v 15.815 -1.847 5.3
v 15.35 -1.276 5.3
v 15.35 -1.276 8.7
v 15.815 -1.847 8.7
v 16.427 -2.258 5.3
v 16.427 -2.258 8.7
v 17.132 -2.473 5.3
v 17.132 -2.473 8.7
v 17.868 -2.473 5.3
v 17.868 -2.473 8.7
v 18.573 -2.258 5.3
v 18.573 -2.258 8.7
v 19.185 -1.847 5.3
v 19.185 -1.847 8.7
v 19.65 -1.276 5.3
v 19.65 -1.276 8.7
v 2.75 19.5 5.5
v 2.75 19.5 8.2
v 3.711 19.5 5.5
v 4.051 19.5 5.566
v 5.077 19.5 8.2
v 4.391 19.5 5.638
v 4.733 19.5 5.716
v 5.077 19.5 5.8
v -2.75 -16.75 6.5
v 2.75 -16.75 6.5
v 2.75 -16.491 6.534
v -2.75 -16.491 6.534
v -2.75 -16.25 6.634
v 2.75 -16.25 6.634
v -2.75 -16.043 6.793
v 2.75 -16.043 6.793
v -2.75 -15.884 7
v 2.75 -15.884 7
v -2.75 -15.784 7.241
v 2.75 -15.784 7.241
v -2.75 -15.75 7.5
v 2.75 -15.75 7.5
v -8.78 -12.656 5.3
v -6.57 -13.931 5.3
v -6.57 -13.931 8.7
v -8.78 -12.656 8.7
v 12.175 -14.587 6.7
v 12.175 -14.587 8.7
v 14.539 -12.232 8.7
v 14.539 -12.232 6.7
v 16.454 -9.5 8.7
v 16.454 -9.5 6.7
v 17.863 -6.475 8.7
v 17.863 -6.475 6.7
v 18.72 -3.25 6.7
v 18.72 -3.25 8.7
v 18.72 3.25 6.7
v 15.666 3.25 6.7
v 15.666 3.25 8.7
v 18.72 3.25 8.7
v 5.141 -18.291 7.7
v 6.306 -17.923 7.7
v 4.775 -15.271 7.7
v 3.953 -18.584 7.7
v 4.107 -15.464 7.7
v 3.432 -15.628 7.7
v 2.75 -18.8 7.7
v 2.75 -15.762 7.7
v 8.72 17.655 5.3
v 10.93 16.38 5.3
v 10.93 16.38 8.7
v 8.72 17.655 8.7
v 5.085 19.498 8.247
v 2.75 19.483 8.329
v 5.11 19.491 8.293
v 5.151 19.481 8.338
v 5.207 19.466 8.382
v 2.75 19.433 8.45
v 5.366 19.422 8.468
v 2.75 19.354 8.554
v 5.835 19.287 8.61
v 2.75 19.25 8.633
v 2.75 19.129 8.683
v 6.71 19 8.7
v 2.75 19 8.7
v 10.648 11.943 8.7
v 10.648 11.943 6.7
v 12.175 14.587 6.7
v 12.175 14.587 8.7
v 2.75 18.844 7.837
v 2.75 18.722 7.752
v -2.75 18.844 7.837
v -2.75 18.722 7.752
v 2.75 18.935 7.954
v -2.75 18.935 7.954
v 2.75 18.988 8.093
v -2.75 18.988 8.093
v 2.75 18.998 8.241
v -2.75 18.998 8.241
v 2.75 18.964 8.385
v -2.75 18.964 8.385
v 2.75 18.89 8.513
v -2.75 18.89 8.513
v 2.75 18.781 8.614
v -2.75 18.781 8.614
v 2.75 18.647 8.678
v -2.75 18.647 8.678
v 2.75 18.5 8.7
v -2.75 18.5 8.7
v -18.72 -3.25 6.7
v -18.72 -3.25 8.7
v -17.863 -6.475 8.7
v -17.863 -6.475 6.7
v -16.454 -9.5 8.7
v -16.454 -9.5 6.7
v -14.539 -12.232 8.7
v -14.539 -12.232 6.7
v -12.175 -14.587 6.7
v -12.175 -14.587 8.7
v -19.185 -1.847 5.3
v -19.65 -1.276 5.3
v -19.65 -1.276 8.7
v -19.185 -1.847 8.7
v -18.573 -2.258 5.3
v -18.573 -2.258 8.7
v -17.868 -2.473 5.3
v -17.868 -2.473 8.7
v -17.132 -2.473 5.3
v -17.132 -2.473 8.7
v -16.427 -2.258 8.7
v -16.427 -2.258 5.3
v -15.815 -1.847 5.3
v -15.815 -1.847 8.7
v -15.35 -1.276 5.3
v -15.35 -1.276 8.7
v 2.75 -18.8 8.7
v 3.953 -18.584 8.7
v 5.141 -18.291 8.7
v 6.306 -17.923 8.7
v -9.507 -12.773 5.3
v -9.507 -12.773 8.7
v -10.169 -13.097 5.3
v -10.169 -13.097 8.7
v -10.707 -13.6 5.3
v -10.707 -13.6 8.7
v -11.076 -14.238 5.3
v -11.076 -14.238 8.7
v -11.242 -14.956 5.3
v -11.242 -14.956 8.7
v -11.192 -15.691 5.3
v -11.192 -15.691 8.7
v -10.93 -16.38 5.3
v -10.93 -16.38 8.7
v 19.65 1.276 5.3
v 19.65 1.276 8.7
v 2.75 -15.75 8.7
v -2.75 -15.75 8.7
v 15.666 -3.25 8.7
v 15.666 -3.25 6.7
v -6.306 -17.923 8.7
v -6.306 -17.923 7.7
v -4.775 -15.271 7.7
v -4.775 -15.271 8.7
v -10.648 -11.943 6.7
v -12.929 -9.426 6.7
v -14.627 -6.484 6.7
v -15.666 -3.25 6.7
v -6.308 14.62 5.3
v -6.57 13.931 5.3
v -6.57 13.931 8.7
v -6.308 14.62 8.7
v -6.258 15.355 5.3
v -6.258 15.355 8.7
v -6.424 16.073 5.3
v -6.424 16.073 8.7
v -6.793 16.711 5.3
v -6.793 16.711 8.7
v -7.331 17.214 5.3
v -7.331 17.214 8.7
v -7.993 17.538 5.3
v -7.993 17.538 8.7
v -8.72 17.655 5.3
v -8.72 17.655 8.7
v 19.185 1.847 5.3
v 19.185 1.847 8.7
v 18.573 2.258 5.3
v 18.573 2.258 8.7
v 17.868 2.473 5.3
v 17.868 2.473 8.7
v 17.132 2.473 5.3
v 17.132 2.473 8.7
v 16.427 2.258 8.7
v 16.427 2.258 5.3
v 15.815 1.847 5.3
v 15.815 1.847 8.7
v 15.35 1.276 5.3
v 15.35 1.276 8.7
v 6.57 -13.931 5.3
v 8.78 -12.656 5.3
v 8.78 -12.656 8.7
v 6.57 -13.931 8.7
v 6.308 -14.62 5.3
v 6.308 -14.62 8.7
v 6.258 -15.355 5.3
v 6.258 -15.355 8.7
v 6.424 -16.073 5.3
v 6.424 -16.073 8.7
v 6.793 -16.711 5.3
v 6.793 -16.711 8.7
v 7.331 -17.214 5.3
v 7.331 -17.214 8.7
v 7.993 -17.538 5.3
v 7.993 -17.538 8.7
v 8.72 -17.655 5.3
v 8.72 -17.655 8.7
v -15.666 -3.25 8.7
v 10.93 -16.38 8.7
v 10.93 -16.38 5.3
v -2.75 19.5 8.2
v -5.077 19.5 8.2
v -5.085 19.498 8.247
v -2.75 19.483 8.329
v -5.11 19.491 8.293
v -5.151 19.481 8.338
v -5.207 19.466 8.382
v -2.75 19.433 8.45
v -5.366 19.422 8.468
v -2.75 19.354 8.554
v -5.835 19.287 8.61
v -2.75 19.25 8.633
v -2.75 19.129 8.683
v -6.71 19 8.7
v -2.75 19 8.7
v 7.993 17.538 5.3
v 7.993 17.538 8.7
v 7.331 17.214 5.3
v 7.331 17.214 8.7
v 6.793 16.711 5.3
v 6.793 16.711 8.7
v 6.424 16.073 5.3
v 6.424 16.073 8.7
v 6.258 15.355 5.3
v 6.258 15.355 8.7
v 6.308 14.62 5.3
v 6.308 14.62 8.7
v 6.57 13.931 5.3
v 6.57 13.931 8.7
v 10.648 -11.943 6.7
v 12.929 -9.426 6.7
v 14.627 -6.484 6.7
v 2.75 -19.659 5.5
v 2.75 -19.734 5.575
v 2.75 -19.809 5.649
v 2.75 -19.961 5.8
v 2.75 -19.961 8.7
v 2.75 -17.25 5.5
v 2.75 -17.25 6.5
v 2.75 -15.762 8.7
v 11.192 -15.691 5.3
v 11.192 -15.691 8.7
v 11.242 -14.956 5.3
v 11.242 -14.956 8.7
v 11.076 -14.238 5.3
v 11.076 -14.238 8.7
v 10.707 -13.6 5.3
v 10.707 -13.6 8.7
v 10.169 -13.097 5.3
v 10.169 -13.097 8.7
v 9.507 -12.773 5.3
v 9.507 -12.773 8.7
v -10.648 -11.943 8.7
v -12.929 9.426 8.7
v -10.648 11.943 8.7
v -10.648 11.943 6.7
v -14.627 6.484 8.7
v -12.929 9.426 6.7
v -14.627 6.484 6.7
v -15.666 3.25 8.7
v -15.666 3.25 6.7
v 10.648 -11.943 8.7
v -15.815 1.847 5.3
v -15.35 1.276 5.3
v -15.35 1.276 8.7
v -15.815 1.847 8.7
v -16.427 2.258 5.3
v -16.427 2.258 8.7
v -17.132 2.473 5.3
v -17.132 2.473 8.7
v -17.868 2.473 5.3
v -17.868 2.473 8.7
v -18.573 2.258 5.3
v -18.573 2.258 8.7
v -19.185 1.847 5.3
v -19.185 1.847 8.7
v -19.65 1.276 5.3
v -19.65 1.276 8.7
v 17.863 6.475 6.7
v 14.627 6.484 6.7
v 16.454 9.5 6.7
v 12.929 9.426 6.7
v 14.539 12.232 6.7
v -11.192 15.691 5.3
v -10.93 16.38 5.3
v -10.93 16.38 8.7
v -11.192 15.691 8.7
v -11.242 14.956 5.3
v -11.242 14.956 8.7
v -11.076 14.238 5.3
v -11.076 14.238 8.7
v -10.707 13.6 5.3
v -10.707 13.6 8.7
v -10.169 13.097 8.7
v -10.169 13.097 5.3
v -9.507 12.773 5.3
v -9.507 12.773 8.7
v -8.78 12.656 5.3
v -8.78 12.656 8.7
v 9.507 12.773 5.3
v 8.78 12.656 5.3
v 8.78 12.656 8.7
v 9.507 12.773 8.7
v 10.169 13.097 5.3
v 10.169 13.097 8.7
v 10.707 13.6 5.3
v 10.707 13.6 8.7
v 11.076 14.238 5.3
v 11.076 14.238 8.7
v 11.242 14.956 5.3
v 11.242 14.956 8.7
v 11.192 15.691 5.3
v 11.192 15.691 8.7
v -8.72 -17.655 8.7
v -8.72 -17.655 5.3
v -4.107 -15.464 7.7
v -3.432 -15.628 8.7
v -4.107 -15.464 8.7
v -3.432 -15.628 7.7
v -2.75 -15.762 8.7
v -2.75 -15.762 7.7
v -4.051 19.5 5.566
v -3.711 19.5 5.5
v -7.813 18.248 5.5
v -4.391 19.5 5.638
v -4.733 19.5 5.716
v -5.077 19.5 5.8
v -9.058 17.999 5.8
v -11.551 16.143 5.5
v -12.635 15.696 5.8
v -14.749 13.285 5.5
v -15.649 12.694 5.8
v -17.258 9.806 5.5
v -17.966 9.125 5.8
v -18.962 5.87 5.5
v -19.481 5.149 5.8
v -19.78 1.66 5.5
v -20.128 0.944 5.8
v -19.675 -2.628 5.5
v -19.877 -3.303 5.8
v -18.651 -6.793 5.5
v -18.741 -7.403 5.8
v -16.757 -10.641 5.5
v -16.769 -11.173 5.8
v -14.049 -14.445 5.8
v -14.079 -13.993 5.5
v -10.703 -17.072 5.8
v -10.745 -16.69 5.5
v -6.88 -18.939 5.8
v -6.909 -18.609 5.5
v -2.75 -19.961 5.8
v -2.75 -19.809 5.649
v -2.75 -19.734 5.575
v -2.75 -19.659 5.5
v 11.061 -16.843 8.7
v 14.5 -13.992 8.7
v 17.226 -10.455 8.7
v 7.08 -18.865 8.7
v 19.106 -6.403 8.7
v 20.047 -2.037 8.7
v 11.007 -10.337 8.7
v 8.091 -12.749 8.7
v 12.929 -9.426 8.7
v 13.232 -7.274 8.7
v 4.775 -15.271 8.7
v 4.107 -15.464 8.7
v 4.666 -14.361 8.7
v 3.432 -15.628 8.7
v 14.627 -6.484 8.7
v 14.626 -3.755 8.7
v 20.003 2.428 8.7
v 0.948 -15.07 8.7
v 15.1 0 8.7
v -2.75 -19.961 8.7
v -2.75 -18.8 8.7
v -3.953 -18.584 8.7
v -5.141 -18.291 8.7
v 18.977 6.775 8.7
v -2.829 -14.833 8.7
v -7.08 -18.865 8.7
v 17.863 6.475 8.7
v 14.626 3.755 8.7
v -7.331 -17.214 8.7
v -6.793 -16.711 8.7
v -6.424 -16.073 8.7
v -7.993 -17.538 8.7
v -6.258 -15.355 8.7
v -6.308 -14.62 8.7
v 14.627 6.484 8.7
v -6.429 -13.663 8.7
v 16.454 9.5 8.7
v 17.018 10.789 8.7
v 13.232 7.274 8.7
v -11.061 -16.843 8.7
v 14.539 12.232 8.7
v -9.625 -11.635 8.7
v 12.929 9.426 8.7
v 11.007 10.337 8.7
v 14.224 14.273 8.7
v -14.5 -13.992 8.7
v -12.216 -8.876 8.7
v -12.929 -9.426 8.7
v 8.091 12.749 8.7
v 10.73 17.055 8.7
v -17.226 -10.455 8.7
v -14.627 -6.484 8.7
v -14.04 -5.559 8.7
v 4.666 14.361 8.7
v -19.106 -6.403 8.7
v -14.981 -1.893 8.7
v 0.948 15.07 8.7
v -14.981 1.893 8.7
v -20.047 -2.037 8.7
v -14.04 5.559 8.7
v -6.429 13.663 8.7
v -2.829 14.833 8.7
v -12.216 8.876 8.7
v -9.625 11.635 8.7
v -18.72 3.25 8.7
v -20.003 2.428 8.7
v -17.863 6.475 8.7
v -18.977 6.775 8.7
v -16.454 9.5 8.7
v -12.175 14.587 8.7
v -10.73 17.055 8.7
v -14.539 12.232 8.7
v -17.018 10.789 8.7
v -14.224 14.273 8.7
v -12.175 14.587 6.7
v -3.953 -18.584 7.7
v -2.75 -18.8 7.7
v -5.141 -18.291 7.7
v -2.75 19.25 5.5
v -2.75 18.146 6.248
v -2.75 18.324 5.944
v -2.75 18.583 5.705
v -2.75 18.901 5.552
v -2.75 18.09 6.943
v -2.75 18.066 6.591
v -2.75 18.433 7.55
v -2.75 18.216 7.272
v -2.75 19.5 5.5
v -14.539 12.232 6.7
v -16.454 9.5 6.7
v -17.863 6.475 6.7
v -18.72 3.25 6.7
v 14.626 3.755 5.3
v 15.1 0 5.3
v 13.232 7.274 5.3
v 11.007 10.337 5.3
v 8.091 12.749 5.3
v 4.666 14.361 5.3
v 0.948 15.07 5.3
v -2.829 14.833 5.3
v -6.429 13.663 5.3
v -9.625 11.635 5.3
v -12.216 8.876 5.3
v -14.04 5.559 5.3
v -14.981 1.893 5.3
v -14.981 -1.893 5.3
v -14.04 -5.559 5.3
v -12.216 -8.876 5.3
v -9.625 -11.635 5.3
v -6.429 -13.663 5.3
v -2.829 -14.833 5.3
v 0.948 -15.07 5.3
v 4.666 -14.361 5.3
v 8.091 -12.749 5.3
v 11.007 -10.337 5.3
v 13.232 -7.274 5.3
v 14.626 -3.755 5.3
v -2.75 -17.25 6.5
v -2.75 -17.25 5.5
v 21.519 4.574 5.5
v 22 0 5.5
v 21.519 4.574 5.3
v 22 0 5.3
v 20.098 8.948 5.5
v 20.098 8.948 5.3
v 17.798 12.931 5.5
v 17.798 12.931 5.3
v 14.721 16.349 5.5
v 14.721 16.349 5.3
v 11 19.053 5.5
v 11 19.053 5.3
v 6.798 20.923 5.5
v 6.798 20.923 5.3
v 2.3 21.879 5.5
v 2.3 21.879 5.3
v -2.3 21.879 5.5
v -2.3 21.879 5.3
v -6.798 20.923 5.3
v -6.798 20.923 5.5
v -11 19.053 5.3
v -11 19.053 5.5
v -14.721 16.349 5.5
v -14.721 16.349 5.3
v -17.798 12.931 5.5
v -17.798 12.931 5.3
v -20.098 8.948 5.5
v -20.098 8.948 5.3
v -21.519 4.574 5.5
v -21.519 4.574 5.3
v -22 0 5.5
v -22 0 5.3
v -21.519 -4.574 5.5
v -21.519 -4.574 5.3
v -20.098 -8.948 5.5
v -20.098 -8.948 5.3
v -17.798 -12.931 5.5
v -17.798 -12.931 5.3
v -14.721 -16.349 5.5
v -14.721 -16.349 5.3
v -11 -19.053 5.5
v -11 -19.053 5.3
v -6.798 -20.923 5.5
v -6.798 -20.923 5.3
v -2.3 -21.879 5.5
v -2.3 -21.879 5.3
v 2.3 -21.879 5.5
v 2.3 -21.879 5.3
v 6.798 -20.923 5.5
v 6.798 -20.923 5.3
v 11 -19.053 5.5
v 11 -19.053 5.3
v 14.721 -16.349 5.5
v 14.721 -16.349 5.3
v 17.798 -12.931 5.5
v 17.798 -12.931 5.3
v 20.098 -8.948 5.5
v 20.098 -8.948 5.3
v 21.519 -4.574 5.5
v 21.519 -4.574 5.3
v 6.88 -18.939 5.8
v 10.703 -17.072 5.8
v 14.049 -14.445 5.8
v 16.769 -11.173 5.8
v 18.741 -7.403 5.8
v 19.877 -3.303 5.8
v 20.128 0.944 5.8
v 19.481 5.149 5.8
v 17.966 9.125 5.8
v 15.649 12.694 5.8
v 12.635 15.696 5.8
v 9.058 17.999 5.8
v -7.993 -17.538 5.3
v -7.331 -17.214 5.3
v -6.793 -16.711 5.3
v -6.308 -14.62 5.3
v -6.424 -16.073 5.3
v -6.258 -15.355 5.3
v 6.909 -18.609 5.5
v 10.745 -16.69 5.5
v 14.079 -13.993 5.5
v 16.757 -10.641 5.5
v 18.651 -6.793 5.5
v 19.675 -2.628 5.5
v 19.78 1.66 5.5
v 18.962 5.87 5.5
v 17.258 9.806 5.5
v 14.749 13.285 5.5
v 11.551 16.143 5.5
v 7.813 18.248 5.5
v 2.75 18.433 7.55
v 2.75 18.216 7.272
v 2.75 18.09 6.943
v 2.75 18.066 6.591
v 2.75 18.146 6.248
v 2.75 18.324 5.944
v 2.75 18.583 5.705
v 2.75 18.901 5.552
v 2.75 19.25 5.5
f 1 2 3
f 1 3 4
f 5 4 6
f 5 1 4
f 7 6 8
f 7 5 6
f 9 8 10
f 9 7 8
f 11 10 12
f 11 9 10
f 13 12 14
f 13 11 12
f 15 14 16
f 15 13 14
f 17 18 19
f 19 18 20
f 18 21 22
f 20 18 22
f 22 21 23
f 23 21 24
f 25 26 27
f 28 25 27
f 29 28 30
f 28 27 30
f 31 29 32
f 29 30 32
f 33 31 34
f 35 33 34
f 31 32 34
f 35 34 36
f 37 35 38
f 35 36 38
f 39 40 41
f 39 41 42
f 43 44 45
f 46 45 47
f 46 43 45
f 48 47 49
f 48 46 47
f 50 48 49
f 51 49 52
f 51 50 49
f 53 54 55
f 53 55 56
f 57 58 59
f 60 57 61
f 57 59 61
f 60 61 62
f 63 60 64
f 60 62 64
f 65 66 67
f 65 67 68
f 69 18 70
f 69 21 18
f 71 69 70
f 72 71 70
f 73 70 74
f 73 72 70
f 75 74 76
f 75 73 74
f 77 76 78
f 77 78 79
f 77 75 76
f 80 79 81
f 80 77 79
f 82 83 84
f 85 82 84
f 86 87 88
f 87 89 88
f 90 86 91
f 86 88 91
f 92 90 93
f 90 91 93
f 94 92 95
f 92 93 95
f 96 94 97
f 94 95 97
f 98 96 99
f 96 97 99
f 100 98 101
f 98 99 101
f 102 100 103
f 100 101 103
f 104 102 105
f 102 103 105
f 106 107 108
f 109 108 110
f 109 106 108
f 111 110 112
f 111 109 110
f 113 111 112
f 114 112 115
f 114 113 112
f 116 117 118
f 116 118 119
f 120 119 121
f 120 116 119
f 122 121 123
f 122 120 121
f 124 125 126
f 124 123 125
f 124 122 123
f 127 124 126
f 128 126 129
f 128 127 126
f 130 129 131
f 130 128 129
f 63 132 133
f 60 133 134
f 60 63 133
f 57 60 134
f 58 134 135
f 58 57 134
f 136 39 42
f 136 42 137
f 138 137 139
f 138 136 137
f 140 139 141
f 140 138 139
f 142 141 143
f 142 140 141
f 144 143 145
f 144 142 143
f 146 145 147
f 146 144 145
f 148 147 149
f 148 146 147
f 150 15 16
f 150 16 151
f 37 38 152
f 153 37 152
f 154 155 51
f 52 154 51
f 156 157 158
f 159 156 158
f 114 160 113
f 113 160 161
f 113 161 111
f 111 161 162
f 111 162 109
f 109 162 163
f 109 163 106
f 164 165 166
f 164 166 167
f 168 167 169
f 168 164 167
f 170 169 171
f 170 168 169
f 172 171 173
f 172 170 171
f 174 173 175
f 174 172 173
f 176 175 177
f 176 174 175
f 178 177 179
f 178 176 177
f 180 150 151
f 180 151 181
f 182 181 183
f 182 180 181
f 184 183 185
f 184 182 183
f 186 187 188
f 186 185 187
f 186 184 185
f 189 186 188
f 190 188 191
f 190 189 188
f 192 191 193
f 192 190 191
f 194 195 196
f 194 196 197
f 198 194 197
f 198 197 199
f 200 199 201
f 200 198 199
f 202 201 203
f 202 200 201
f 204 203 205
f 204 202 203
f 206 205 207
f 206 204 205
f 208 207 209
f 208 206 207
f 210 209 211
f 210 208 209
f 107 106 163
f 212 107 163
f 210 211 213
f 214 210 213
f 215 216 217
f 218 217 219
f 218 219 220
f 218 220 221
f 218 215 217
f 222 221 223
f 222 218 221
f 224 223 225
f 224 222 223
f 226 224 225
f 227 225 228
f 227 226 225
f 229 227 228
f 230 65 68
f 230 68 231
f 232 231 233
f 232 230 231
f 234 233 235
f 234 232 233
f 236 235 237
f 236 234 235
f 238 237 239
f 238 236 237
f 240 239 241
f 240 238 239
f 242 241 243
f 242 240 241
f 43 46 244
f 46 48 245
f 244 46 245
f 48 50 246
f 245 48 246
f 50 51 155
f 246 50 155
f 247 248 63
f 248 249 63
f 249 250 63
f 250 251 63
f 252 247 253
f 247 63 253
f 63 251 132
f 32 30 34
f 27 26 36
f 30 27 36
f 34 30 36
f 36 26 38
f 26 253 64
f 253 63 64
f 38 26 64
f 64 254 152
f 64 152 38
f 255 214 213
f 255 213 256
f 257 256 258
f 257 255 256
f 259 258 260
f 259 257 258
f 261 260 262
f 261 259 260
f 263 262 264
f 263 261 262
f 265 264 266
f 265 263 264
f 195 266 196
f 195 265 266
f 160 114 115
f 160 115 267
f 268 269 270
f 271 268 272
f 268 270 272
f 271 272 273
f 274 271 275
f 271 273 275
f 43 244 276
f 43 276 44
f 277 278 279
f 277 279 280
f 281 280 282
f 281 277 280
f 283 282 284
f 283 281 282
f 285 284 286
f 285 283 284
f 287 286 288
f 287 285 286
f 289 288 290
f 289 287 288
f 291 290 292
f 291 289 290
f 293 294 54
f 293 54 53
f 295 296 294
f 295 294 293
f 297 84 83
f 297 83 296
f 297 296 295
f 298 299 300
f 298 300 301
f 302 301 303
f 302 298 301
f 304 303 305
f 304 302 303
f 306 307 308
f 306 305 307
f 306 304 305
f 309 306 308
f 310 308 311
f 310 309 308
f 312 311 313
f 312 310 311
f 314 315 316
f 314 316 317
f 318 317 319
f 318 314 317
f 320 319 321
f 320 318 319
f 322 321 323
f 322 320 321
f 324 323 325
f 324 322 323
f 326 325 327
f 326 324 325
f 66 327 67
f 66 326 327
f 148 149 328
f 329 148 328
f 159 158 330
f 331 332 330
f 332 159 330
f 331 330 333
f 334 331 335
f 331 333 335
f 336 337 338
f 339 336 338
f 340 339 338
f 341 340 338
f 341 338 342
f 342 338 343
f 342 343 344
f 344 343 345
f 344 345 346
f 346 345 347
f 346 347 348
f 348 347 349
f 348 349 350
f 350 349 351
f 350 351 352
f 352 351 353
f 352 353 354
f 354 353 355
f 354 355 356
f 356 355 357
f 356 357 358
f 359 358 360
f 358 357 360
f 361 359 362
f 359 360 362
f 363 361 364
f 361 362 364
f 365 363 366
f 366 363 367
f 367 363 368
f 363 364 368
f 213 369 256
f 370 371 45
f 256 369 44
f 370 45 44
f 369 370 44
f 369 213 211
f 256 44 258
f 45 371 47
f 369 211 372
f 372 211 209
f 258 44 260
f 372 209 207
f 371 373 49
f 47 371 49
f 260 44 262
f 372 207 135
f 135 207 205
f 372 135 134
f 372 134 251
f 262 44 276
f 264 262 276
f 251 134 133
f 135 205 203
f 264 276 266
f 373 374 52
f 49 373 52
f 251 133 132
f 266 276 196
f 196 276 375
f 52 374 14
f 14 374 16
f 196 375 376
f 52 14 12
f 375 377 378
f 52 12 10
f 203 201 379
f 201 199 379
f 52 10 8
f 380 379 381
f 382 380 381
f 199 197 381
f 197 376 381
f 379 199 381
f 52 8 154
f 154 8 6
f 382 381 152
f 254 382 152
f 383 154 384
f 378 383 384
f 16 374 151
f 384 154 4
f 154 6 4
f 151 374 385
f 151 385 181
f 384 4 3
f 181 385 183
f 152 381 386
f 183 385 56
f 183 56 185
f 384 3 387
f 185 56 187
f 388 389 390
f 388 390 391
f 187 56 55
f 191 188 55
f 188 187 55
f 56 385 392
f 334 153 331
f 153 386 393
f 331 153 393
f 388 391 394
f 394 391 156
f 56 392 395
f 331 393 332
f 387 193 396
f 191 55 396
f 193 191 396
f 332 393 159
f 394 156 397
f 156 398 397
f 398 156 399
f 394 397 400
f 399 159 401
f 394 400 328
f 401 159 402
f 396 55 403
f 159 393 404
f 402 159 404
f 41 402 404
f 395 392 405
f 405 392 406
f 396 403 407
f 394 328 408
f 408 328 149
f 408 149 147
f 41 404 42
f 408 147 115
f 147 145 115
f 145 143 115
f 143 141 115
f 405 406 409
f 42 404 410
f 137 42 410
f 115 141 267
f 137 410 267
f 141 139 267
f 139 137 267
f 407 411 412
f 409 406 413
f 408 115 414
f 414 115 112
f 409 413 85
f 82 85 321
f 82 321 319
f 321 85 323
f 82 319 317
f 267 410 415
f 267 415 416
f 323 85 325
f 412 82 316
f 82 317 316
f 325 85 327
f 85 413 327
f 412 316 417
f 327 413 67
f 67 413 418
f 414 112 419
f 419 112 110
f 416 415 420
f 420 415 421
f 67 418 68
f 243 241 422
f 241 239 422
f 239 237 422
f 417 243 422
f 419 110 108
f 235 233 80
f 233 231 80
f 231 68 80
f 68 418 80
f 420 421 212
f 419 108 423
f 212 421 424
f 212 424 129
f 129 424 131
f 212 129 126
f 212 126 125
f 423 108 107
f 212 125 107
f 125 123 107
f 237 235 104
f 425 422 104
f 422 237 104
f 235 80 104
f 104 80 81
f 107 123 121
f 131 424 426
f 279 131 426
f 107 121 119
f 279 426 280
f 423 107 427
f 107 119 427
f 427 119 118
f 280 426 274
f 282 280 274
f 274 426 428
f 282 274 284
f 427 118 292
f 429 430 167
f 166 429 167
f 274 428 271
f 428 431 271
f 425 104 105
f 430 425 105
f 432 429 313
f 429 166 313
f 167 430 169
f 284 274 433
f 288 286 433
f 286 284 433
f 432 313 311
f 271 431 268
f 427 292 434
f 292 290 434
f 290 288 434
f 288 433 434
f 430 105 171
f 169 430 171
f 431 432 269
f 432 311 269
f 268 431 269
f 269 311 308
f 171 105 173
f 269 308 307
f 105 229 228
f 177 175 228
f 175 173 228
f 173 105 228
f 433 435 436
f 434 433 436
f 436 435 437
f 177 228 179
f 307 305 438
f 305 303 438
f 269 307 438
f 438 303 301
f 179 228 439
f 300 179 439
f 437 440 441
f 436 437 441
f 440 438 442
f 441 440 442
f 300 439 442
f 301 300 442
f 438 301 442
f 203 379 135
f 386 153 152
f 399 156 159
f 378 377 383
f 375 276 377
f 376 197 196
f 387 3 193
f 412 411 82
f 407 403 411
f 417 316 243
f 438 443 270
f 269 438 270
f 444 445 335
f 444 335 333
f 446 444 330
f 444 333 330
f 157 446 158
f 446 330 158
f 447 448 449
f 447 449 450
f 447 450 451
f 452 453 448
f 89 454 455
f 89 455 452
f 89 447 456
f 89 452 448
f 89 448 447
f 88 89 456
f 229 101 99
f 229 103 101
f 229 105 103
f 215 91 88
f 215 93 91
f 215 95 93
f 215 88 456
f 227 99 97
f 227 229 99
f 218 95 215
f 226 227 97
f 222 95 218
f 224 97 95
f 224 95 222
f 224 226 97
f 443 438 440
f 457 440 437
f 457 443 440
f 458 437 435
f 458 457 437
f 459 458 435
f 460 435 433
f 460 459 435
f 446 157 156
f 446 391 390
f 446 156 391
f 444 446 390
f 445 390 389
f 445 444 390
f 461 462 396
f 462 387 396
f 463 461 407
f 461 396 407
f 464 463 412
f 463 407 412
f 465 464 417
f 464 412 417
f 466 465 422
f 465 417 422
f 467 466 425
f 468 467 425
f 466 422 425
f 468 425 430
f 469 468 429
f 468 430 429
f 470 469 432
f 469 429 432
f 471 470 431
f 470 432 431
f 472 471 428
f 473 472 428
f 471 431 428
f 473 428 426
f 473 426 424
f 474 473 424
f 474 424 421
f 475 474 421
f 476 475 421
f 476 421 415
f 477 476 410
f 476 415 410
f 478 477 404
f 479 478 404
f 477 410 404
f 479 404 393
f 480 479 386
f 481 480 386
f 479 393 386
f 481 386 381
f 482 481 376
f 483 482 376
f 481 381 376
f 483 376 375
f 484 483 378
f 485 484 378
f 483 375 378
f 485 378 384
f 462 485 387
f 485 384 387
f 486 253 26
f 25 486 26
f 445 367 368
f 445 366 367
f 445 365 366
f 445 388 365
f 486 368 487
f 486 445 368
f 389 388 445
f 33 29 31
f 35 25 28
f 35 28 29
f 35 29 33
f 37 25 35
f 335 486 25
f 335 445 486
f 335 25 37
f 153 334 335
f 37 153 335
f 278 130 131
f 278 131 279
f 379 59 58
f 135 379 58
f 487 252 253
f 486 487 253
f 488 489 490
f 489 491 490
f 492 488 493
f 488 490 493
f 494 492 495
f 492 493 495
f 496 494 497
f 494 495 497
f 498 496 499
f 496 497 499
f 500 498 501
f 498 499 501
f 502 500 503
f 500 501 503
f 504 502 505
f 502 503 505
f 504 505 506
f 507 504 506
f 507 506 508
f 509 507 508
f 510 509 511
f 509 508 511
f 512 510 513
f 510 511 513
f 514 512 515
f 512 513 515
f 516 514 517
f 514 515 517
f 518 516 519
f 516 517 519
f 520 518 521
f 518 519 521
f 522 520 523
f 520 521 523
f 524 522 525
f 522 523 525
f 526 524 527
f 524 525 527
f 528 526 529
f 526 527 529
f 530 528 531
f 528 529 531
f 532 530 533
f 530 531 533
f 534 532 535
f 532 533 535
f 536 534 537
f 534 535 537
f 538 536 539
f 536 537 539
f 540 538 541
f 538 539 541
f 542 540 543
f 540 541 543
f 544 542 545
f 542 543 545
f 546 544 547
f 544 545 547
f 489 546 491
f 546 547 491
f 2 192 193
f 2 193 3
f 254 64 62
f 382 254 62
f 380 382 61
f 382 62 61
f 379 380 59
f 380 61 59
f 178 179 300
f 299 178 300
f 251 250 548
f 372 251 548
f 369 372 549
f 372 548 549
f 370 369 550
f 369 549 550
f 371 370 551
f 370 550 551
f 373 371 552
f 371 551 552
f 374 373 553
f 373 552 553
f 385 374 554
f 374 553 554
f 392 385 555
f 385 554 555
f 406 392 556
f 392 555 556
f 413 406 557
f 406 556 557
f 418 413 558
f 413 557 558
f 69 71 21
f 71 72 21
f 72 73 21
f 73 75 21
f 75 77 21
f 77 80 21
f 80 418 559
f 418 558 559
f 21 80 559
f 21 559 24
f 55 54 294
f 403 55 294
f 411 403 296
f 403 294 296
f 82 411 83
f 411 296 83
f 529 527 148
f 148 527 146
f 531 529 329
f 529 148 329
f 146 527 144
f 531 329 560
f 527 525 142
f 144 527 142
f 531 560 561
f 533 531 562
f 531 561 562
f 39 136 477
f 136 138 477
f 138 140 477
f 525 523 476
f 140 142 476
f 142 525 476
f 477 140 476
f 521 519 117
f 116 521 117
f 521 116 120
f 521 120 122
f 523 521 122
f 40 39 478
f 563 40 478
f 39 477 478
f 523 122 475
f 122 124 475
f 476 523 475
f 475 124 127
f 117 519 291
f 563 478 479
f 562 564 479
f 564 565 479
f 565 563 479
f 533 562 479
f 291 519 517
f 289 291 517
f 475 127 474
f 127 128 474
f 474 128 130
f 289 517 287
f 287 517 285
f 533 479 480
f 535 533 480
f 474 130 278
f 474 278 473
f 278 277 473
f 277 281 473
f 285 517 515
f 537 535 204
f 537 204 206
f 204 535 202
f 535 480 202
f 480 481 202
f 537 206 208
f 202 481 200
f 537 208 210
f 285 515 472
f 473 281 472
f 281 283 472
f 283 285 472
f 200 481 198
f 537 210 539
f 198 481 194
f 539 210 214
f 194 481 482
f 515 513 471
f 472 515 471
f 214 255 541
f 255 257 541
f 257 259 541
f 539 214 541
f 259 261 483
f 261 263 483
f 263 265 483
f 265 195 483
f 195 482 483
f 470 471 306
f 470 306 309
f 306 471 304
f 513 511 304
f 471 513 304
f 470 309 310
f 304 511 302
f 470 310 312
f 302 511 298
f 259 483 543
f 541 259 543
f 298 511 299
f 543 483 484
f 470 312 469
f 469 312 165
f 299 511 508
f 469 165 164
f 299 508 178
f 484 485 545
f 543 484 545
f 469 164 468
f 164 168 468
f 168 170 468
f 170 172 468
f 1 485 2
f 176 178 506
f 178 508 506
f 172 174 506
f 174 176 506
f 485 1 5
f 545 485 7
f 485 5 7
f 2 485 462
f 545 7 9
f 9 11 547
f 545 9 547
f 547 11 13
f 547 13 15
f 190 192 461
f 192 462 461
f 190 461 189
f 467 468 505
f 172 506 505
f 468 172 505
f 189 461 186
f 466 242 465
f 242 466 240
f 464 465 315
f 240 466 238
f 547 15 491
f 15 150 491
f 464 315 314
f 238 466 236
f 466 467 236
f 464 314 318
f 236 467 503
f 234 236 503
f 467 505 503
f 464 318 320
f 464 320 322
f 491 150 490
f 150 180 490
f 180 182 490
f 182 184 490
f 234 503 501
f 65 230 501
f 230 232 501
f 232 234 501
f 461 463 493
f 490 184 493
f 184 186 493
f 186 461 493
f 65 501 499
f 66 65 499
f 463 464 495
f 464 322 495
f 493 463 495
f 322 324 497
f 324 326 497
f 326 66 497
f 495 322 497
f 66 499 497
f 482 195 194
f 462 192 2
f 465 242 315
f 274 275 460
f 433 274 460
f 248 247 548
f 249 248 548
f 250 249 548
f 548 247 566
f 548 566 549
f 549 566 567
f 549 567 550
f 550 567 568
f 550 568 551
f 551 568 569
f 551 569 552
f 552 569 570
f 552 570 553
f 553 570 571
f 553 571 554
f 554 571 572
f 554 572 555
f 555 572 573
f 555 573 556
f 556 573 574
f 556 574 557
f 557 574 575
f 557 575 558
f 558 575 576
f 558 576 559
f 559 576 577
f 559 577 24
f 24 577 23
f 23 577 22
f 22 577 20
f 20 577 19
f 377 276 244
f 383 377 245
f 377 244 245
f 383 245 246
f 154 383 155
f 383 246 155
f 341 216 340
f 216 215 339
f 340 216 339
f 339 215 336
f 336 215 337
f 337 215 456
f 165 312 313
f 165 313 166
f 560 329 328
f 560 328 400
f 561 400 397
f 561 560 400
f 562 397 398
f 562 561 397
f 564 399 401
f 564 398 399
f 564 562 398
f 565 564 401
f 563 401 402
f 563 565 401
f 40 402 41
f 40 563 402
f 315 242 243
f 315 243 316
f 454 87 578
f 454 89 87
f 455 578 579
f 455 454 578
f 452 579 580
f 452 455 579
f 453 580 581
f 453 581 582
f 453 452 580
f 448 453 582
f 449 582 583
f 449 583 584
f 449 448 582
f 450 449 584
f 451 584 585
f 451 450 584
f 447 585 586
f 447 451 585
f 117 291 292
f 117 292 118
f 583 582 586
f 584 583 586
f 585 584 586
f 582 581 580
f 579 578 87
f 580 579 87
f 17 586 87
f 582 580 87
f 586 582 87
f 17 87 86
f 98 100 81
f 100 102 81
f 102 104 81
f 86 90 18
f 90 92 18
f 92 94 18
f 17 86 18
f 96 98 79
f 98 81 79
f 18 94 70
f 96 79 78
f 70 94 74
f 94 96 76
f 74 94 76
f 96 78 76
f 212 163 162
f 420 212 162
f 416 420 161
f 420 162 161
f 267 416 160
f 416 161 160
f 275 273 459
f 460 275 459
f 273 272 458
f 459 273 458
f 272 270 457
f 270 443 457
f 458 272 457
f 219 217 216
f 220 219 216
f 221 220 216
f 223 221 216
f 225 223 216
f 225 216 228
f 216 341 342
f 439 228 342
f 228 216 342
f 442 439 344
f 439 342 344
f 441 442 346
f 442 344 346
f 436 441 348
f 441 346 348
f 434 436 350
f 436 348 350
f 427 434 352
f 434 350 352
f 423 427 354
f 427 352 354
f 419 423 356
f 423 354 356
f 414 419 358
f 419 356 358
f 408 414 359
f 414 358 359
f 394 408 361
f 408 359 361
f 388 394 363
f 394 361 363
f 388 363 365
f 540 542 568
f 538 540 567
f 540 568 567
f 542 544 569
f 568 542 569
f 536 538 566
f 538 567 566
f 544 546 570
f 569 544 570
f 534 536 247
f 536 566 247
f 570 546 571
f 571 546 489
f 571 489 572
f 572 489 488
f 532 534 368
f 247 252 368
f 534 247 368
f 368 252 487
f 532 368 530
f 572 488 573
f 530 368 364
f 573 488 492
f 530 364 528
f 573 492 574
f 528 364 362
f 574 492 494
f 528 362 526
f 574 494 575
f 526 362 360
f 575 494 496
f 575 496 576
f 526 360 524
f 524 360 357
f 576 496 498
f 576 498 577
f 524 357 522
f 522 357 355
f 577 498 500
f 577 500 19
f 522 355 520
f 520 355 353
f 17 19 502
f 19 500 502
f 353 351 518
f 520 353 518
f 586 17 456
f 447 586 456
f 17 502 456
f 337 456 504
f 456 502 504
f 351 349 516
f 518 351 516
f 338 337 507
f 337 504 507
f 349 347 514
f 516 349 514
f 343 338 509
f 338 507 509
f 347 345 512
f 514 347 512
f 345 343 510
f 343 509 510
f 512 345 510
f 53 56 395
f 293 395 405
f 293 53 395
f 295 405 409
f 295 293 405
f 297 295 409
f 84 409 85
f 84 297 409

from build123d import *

# Parameters (mm, degrees)
POCKET_DEPTH         = 128.037431
POLARPATTERN_COUNT   = 6
POCKET004_DEPTH      = 1.001
POCKET005_DEPTH      = 2.001
POCKET006_DEPTH      = 22.001
POCKET006_DEPTH_BACK = -22.001
POCKET007_DEPTH      = 2.75


with BuildPart() as part:
    # Sketch → Revolution (revolve)
    with BuildSketch(Plane.XZ):
        Polygon((19.85, 5.5), (22, 5.5), (22, 5.3), (15.1, 5.3), (15.1, 8.7), (20.15, 8.7), (20.15, 5.8), align=None)
    revolve(axis=Axis((0, 0, 0), (0, 0, 1)))

    # Sketch001 → Pocket (cut, through all)
    with BuildSketch(Plane.XY.offset(5.3)):
        with BuildLine():
            ThreePointArc((-15.35, 1.275735), (-17.5, 2.5), (-19.65, 1.275735))
            Line((-19.65, 1.275735), (-19.65, -1.275735))
            ThreePointArc((-19.65, -1.275735), (-17.5, -2.5), (-15.35, -1.275735))
            Line((-15.35, -1.275735), (-15.35, 1.275735))
        make_face()
    pocket = extrude(amount=POCKET_DEPTH, mode=Mode.SUBTRACT)

    # PolarPattern: Pocket ×6 about axis
    polarpattern_axis = Axis((0, 0, 0), (0, 0, 1))
    for i in range(1, POLARPATTERN_COUNT):
        add(pocket.rotate(polarpattern_axis, i * 360 / POLARPATTERN_COUNT), mode=Mode.SUBTRACT)

    # Sketch005 → Pocket004 (cut, through all)
    with BuildSketch(Plane.XY.offset(7.7)):
        with BuildLine():
            ThreePointArc((-4.775159, -15.270817), (0, -16), (4.775159, -15.270817))
            Line((4.775159, -15.270817), (6.306336, -17.922894))
            ThreePointArc((-6.306336, -17.922894), (0, -19), (6.306336, -17.922894))
            Line((-6.306336, -17.922894), (-4.775159, -15.270817))
        make_face()
    extrude(amount=POCKET004_DEPTH, mode=Mode.SUBTRACT)

    # Sketch006 → Pocket005 (cut, through all)
    with BuildSketch(Plane.XY.offset(6.7)):
        with BuildLine():
            ThreePointArc((-10.647805, 11.942539), (-13.856406, 8), (-15.666445, 3.25))
            Line((-15.666445, 3.25), (-18.719976, 3.25))
            ThreePointArc((-12.174571, 14.586975), (-16.454483, 9.5), (-18.719976, 3.25))
            Line((-12.174571, 14.586975), (-10.647805, 11.942539))
        make_face()
        with BuildLine():
            ThreePointArc((-15.666445, -3.25), (-13.856406, -8), (-10.647805, -11.942539))
            Line((-12.174571, -14.586975), (-10.647805, -11.942539))
            ThreePointArc((-18.719976, -3.25), (-16.454483, -9.5), (-12.174571, -14.586975))
            Line((-18.719976, -3.25), (-15.666445, -3.25))
        make_face()
        with BuildLine():
            ThreePointArc((10.647805, -11.942539), (13.856406, -8), (15.666445, -3.25))
            Line((15.666445, -3.25), (18.719976, -3.25))
            ThreePointArc((12.174571, -14.586975), (16.454483, -9.5), (18.719976, -3.25))
            Line((10.647805, -11.942539), (12.174571, -14.586975))
        make_face()
        with BuildLine():
            ThreePointArc((18.719976, 3.25), (16.454483, 9.5), (12.174571, 14.586975))
            Line((10.647805, 11.942539), (12.174571, 14.586975))
            ThreePointArc((15.666445, 3.25), (13.856406, 8), (10.647805, 11.942539))
            Line((15.666445, 3.25), (18.719976, 3.25))
        make_face()
    extrude(amount=POCKET005_DEPTH, mode=Mode.SUBTRACT)

    # Sketch008 → Pocket006 (cut, two sides)
    with BuildSketch(Plane.YZ) as pocket006_sk:
        with BuildLine():
            Line((19, 10), (19, 8.7))
            ThreePointArc((19.5, 8.2), (19.353553, 8.553553), (19, 8.7))
            Line((19.5, 8.2), (19.5, 5.5))
            Line((20.5, 5.5), (19.5, 5.5))
            Line((20.5, 10), (20.5, 5.5))
            Line((19, 10), (20.5, 10))
        make_face()
    extrude(amount=-POCKET006_DEPTH, mode=Mode.SUBTRACT)
    extrude(pocket006_sk.sketch, amount=-POCKET006_DEPTH_BACK, mode=Mode.SUBTRACT)

    # Sketch004 → Pocket007 (cut, symmetric)
    with BuildSketch(Plane.YZ):
        with BuildLine():
            Line((21, 11), (18.5, 11))
            Line((18.5, 11), (18.5, 8.7))
            ThreePointArc((18.722171, 7.752071), (18.986808, 8.314096), (18.5, 8.7))
            ThreePointArc((18.722171, 7.752071), (18.09345, 6.416824), (19.25, 5.5))
            Line((19.25, 5.5), (21, 5.5))
            Line((21, 5.5), (21, 11))
        make_face()
        with BuildLine():
            Line((-20.75, 11), (-20.75, 5.5))
            Line((-20.75, 5.5), (-19, 5.5))
            Line((-19, 5.5), (-17.25, 5.5))
            Line((-17.25, 5.5), (-17.25, 6.5))
            Line((-17.25, 6.5), (-16.75, 6.5))
            ThreePointArc((-16.75, 6.5), (-16.042893, 6.792893), (-15.75, 7.5))
            Line((-15.75, 7.5), (-15.75, 11))
            Line((-20.75, 11), (-15.75, 11))
        make_face()
    extrude(amount=POCKET007_DEPTH, both=True, mode=Mode.SUBTRACT)


solid = part.part
